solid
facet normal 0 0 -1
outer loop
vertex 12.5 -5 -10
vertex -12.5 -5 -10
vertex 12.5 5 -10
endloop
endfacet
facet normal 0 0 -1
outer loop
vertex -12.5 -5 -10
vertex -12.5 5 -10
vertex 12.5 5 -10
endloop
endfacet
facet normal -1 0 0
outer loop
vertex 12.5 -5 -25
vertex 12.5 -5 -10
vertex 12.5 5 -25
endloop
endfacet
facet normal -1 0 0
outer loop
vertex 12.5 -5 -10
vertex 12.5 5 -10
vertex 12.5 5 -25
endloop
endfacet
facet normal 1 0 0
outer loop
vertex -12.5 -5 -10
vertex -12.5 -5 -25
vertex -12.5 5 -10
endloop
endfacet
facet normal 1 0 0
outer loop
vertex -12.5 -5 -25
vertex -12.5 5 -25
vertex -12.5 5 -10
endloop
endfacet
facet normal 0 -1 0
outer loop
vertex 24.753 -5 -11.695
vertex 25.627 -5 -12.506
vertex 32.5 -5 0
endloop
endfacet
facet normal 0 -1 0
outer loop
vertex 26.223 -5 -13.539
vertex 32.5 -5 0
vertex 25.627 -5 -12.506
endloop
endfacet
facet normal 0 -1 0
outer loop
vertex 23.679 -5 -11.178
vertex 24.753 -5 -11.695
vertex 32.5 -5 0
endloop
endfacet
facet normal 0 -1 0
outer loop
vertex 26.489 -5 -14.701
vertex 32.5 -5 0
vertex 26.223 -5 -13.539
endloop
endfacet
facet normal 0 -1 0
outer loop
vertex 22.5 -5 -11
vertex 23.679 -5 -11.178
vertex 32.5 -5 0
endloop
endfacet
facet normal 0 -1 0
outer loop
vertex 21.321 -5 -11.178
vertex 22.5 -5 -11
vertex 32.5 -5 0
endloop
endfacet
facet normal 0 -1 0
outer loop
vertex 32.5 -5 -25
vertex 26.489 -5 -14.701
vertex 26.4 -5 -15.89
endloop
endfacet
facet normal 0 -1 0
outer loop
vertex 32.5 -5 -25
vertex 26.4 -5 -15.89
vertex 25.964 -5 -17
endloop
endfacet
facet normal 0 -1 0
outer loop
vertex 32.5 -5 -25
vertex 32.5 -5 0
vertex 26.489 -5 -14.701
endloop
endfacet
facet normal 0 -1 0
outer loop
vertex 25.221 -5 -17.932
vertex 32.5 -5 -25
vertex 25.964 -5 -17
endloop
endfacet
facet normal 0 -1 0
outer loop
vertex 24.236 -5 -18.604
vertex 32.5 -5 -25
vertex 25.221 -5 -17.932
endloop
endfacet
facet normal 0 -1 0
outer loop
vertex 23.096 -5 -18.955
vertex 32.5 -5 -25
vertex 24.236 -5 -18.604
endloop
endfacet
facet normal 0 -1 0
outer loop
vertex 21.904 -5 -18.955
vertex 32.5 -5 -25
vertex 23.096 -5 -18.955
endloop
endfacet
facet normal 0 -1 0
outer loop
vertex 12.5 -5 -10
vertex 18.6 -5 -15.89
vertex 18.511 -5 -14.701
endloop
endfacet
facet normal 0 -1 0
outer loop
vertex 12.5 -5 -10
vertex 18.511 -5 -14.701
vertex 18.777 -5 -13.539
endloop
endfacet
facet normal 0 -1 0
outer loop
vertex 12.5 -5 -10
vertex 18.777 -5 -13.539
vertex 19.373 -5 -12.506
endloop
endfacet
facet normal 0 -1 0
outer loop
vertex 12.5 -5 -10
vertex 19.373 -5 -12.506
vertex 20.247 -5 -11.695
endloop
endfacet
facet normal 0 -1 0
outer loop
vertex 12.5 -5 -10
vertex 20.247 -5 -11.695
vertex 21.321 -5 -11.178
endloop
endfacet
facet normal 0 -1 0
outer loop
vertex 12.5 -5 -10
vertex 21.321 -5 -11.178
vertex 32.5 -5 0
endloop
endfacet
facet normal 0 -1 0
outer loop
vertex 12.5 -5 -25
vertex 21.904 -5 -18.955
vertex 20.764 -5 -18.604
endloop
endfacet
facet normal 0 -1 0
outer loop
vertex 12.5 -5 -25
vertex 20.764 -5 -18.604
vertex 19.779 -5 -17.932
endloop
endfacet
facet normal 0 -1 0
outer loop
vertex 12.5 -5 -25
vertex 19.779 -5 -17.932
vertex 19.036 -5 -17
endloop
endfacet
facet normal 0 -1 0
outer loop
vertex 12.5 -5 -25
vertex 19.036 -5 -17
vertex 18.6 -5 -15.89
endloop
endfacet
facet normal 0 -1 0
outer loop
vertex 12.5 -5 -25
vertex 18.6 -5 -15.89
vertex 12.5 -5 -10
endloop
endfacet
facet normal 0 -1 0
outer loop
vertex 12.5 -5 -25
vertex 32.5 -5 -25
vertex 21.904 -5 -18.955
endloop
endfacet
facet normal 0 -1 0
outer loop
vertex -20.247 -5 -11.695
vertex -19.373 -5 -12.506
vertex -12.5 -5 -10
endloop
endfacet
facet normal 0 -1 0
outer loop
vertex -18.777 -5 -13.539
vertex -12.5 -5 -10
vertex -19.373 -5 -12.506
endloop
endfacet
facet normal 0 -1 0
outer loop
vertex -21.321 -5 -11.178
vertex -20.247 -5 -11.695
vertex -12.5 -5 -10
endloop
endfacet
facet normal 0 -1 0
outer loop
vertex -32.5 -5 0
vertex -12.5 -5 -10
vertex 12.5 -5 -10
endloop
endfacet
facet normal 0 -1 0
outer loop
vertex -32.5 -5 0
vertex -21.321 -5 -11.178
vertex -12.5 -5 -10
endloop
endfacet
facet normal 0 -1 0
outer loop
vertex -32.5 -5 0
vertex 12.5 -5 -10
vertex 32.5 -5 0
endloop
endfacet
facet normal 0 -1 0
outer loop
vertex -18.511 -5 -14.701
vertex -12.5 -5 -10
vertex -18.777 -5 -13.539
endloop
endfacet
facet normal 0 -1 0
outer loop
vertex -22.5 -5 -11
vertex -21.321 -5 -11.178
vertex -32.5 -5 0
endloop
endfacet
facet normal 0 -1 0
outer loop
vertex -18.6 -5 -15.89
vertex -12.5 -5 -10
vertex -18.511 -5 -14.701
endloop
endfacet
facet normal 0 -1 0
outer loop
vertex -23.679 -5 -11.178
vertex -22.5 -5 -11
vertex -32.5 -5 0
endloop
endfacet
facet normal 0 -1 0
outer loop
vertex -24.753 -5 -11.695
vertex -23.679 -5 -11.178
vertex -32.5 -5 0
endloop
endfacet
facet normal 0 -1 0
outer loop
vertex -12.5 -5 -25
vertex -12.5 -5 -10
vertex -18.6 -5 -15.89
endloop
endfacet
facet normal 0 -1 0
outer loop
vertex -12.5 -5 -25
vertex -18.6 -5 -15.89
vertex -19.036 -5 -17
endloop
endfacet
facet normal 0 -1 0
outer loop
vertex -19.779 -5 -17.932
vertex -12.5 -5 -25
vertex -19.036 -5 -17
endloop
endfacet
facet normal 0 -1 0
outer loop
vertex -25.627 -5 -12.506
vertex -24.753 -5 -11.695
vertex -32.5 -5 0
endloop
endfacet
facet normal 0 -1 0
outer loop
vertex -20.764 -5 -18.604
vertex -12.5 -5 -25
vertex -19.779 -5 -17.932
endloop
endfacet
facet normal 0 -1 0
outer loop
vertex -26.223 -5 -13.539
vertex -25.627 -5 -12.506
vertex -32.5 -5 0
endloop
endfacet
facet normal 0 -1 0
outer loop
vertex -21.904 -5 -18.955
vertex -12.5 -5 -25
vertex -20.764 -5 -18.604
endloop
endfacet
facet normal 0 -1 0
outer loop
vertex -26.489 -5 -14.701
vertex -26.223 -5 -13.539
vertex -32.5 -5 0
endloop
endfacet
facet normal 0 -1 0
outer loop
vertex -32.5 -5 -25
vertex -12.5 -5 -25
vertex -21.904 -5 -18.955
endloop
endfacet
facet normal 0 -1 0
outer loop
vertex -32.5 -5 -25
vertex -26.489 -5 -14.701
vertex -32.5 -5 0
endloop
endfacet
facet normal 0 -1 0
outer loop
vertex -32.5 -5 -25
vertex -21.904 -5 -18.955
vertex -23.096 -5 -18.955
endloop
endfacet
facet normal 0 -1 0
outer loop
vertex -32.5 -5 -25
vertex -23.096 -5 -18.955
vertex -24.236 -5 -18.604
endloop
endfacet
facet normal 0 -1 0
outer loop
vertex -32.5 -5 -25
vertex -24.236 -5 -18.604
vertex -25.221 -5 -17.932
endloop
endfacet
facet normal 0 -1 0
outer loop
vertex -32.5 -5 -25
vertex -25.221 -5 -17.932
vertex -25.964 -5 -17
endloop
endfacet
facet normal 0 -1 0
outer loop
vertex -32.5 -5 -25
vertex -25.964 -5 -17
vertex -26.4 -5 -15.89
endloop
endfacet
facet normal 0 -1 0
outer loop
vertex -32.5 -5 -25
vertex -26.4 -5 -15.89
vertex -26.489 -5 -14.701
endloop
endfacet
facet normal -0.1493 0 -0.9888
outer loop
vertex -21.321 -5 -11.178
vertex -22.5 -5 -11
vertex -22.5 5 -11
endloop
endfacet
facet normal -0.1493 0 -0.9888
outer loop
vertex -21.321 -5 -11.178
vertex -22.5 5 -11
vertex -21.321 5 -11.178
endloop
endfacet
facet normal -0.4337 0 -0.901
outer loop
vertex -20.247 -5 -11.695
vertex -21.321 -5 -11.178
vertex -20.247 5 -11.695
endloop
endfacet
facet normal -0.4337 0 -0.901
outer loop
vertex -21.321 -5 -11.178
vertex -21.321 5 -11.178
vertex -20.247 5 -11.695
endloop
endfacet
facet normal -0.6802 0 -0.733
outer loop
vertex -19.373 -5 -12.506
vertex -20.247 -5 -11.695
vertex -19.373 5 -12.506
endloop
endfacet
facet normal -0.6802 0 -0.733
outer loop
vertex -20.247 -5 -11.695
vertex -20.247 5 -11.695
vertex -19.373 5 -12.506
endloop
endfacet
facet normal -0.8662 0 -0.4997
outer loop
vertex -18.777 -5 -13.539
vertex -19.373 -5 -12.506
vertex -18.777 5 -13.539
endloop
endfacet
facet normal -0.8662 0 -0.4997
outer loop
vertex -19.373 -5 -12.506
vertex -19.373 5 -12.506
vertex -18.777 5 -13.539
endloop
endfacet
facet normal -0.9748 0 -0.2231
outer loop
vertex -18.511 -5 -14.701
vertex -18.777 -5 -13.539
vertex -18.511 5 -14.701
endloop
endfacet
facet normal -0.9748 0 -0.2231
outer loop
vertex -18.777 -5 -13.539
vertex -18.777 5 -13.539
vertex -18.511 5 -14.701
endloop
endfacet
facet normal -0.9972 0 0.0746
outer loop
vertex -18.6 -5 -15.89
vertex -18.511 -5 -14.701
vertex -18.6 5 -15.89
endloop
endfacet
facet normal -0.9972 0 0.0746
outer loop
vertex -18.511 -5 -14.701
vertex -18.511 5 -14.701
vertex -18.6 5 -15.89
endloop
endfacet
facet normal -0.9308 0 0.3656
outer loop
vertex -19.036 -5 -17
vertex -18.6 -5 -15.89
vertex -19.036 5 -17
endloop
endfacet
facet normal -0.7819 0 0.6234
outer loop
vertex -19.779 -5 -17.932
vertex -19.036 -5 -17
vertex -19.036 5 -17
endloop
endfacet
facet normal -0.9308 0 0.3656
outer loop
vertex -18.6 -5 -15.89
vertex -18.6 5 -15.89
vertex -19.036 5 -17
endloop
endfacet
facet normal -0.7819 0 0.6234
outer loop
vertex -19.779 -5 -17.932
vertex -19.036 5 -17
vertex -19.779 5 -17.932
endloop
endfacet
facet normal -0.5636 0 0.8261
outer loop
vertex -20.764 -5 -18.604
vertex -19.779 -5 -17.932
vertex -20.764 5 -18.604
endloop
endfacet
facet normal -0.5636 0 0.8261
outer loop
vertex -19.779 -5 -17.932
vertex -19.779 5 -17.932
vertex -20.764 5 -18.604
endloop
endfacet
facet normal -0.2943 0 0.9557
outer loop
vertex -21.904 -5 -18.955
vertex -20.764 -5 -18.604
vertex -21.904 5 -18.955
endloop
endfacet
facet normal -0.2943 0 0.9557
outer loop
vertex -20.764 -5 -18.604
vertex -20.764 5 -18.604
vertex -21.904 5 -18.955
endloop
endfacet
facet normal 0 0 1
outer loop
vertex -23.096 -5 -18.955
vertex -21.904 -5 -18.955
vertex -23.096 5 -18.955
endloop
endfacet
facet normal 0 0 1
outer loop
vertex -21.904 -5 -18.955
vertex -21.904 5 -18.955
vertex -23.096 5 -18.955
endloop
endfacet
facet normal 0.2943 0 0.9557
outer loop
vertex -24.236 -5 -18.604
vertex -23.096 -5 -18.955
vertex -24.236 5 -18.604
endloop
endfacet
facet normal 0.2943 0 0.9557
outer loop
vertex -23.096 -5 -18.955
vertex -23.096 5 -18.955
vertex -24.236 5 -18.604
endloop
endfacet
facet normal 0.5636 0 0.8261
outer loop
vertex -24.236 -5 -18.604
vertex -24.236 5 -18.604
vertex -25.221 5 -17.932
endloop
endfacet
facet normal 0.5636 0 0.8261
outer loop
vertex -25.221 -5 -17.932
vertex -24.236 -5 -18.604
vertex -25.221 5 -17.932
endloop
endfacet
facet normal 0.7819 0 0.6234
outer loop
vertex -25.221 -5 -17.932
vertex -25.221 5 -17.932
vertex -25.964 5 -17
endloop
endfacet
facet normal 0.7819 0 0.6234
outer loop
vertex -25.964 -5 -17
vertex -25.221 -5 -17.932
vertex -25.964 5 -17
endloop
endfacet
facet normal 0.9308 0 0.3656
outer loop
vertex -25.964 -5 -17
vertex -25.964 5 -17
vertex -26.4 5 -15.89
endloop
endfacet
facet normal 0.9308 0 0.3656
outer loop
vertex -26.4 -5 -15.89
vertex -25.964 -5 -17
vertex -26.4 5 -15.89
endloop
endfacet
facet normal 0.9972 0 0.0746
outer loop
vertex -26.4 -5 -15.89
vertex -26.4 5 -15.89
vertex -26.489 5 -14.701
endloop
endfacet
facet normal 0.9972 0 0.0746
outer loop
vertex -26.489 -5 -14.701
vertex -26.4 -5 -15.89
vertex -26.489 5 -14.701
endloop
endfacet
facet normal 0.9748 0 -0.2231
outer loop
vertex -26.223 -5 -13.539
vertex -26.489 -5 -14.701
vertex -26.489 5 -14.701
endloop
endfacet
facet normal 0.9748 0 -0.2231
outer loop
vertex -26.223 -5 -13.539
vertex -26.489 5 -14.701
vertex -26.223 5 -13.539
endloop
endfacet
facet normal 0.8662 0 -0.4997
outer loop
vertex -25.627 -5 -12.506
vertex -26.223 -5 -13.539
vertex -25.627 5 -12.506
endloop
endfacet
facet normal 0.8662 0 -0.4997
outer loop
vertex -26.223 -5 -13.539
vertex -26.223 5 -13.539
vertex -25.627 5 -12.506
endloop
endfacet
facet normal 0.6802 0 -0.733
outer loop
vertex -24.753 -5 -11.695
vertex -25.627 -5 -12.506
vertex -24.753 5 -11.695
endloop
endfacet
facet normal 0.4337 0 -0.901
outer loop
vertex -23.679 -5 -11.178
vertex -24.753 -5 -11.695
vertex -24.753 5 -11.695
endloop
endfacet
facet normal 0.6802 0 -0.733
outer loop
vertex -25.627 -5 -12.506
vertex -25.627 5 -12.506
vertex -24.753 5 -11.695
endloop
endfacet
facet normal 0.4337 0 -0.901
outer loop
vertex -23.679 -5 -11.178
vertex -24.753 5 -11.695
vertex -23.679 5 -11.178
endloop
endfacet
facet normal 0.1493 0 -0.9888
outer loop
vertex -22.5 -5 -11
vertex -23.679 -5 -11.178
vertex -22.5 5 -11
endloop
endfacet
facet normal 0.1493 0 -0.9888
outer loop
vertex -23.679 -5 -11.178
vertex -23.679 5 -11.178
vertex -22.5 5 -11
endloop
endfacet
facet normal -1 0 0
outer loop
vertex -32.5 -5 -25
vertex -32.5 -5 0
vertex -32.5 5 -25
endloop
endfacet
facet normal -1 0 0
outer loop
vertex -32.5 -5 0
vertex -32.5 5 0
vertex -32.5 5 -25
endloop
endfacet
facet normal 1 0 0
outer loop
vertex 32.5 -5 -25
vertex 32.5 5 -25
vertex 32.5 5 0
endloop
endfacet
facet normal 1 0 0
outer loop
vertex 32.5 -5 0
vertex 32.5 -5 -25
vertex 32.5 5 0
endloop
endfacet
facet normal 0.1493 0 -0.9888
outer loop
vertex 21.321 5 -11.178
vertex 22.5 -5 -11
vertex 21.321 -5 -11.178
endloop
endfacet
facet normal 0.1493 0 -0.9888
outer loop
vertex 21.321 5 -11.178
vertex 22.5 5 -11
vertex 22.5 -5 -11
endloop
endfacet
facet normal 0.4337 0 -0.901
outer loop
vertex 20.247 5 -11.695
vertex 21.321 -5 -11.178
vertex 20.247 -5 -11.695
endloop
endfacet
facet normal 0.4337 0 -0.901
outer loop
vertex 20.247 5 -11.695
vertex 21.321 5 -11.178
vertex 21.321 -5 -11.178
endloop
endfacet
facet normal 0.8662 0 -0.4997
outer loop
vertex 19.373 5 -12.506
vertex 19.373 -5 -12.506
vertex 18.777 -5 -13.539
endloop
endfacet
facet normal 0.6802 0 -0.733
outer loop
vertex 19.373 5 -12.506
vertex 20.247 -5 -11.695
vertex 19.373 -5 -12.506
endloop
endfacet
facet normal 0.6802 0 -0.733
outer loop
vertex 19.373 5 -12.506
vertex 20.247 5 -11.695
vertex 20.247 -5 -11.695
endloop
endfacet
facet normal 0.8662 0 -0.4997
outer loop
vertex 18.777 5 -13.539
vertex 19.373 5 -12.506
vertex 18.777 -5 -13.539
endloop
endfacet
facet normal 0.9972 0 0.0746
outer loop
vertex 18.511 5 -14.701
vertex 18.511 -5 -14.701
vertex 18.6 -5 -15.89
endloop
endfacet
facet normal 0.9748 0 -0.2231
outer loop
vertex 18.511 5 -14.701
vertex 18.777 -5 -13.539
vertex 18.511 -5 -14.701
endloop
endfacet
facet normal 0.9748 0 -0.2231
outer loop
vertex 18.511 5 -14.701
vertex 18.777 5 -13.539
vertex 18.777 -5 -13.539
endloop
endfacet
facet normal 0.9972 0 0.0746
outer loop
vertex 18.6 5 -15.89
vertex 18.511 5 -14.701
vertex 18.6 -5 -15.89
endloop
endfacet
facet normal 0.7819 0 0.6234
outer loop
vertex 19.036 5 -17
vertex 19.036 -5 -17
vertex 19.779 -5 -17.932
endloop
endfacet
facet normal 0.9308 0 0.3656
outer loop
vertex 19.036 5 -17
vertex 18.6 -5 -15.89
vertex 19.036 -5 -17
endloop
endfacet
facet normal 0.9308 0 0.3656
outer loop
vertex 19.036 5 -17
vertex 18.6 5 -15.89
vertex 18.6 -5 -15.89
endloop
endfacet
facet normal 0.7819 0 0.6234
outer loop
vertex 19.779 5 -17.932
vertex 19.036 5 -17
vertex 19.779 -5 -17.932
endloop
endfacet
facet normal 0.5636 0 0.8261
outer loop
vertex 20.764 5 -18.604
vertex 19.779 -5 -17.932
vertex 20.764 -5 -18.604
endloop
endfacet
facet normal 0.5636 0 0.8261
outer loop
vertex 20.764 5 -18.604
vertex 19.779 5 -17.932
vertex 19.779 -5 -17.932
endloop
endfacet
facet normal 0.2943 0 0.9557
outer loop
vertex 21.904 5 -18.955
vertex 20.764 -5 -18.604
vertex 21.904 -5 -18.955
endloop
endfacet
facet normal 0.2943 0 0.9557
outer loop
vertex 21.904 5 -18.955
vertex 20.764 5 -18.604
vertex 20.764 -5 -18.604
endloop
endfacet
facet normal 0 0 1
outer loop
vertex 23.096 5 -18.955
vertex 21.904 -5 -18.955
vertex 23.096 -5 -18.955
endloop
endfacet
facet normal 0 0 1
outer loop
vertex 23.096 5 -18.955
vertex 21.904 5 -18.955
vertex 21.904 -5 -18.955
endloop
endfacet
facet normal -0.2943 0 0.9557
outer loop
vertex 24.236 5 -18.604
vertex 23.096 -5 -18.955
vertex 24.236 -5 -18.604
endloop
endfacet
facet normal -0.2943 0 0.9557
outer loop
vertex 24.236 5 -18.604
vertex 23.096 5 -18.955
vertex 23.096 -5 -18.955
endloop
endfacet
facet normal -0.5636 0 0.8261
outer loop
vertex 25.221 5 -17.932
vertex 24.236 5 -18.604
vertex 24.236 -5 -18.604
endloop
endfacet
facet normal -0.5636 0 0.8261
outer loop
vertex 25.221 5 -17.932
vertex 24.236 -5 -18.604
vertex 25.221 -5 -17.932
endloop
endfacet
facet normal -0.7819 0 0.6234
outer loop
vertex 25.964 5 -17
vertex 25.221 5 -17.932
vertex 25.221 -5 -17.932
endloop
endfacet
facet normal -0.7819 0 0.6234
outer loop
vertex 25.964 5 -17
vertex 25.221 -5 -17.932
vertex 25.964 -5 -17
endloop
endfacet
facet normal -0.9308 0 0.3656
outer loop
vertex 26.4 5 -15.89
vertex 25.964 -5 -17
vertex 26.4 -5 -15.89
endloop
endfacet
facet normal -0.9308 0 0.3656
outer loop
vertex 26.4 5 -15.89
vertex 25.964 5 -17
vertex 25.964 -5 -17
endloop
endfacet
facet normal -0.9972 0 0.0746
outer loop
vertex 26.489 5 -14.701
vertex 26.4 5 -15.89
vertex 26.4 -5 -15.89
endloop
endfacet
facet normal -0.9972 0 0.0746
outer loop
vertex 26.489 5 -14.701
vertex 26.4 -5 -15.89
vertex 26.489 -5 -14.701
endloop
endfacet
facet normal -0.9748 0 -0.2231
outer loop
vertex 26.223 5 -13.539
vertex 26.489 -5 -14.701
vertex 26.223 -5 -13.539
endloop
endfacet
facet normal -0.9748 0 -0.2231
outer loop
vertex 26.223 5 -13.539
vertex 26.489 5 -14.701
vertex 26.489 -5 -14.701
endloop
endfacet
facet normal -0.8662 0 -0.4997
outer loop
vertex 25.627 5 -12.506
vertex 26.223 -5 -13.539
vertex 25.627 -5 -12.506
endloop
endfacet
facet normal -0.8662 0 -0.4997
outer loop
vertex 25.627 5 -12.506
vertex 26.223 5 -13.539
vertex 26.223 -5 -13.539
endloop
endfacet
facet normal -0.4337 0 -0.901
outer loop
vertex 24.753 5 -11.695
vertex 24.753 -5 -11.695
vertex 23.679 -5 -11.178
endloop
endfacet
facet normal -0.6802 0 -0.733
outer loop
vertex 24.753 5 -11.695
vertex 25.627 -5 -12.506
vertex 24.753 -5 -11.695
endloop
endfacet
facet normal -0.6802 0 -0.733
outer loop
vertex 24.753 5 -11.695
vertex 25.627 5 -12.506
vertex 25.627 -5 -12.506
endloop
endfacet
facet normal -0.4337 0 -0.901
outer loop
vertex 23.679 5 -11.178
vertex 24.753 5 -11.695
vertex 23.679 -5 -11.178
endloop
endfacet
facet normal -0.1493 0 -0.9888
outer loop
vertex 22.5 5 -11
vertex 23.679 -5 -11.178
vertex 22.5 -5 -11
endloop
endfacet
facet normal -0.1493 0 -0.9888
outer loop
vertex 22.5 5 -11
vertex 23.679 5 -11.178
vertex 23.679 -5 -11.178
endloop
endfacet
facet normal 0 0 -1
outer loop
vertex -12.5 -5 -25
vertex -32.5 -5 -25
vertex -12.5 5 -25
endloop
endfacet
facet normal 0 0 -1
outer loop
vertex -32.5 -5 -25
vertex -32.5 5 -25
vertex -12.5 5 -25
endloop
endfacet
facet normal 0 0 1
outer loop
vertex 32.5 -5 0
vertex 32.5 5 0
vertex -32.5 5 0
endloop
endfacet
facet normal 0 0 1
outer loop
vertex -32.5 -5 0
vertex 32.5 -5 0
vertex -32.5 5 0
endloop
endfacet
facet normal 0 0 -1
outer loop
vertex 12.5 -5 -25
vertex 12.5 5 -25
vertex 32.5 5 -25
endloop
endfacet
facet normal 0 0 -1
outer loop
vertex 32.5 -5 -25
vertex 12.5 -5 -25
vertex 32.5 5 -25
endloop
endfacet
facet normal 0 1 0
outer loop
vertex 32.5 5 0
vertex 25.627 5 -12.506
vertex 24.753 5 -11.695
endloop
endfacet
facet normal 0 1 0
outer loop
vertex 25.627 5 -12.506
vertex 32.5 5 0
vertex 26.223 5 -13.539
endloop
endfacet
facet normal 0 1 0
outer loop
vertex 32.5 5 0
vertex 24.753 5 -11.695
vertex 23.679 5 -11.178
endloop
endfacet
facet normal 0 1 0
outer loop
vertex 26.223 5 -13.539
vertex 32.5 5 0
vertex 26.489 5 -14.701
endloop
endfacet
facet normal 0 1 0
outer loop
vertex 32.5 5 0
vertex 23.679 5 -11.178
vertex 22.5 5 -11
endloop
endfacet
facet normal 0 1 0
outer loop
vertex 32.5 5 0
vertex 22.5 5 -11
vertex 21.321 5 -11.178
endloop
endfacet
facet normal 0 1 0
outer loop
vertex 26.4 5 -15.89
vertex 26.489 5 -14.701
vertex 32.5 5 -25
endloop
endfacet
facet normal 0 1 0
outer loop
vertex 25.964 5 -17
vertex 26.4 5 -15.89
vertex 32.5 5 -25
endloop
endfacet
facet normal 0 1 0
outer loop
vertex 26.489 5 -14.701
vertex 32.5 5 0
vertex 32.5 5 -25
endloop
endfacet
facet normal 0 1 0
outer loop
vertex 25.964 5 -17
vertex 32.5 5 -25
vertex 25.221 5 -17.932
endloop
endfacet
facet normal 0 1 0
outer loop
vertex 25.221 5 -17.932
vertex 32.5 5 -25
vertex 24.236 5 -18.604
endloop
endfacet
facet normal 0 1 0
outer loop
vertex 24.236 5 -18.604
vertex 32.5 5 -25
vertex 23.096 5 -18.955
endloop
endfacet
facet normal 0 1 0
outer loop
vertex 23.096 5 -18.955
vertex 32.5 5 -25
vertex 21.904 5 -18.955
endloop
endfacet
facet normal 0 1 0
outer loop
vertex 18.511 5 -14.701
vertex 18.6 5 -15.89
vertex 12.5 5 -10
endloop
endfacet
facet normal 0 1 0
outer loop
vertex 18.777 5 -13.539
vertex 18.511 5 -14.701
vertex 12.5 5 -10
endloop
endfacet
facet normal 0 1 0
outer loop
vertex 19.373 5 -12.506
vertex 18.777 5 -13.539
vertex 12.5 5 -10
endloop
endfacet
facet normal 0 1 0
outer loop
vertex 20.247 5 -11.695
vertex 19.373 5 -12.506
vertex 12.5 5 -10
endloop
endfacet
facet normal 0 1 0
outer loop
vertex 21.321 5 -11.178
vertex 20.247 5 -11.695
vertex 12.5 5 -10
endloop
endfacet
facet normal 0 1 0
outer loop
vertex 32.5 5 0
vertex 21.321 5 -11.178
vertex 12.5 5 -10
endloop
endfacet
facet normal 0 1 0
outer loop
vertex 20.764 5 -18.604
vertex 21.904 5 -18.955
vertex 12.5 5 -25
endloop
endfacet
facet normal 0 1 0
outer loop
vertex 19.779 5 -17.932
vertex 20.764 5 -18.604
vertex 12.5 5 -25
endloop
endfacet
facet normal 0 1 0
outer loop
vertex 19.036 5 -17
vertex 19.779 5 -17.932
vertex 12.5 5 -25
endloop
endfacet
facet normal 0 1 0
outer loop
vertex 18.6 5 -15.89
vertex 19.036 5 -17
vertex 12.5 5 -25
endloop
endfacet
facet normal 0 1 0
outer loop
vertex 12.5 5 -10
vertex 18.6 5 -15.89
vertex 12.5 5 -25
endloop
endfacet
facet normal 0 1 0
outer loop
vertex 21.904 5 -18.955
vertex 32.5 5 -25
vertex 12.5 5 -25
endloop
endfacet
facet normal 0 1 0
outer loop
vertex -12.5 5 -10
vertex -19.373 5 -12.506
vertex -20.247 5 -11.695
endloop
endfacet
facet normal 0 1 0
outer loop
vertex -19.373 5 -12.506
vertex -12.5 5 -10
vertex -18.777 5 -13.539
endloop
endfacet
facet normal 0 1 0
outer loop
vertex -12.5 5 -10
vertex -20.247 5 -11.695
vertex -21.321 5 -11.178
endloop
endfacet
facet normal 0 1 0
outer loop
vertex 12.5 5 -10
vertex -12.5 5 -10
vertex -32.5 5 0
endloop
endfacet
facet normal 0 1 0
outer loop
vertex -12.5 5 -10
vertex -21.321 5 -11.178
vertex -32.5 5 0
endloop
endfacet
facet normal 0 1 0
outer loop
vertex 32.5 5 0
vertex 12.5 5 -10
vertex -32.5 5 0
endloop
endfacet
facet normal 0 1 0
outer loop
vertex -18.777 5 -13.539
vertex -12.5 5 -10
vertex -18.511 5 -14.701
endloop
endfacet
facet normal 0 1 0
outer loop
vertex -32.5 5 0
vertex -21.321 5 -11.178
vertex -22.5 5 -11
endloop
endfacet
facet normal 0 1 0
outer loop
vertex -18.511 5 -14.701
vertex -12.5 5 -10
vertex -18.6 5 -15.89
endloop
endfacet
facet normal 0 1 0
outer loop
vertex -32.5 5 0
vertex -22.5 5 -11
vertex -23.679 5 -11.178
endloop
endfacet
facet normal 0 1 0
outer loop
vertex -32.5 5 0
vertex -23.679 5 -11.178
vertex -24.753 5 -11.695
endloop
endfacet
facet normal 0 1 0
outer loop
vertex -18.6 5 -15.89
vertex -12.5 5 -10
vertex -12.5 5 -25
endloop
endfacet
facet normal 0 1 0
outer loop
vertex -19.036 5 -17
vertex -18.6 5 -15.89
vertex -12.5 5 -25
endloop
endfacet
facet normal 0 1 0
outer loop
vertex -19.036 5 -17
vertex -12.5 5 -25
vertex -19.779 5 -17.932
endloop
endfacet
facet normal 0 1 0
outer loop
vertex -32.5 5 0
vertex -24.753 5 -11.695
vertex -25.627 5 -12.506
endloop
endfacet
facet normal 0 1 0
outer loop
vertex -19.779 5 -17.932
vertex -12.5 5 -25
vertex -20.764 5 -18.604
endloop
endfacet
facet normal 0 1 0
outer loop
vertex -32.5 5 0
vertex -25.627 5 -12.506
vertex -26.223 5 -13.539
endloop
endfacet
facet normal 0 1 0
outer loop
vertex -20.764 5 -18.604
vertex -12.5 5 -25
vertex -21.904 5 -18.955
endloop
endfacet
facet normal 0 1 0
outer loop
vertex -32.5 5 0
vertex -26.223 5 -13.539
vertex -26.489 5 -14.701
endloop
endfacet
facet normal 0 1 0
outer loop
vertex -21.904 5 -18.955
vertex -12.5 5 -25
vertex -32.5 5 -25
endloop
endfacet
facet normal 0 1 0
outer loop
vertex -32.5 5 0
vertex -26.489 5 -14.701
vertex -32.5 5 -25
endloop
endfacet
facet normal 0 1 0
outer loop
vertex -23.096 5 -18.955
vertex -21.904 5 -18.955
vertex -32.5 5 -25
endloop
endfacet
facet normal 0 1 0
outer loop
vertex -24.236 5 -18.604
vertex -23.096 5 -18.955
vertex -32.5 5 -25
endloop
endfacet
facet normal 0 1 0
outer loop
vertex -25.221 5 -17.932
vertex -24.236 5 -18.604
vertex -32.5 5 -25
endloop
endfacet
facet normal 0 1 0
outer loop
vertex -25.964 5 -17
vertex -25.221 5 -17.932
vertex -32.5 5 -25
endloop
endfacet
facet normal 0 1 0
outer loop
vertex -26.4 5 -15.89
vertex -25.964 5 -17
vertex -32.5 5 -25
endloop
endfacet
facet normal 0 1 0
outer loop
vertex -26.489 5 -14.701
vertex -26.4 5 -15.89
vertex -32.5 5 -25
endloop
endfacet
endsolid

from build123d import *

# Parameters (mm, degrees)
BOSS_EXTRUDE1_DEPTH = 5
SKETCH2_R           = 4
CUT_EXTRUDE1_DEPTH  = 43.20485754


with BuildPart() as part:
    # Sketch1 → Boss-Extrude1 (new, symmetric)
    with BuildSketch(Plane(origin=(0, 0, 0), x_dir=(1, 0, 0), z_dir=(0, 1, 0))):
        Polygon((32.5, 0), (-32.5, 0), (-32.5, 25), (-12.5, 25), (-12.5, 10), (12.5, 10), (12.5, 25), (32.5, 25), align=None)
    extrude(amount=BOSS_EXTRUDE1_DEPTH, both=True)

    # Sketch2 → Cut-Extrude1 (cut, symmetric)
    with BuildSketch(Plane(origin=(0, 5, 0), x_dir=(1, 0, 0), z_dir=(0, 1, 0))):
        with Locations(Location((-22.5, 15, 0), (0, 0, 270))):
            Circle(SKETCH2_R)
    cut_extrude1 = extrude(amount=CUT_EXTRUDE1_DEPTH, both=True, mode=Mode.SUBTRACT)

    # Mirror1: Cut-Extrude1 across plane
    add(cut_extrude1.mirror(Plane(origin=(0, 0, 0), x_dir=(0, 0, 1), z_dir=(1, 0, 0))), mode=Mode.SUBTRACT)


solid = part.part
